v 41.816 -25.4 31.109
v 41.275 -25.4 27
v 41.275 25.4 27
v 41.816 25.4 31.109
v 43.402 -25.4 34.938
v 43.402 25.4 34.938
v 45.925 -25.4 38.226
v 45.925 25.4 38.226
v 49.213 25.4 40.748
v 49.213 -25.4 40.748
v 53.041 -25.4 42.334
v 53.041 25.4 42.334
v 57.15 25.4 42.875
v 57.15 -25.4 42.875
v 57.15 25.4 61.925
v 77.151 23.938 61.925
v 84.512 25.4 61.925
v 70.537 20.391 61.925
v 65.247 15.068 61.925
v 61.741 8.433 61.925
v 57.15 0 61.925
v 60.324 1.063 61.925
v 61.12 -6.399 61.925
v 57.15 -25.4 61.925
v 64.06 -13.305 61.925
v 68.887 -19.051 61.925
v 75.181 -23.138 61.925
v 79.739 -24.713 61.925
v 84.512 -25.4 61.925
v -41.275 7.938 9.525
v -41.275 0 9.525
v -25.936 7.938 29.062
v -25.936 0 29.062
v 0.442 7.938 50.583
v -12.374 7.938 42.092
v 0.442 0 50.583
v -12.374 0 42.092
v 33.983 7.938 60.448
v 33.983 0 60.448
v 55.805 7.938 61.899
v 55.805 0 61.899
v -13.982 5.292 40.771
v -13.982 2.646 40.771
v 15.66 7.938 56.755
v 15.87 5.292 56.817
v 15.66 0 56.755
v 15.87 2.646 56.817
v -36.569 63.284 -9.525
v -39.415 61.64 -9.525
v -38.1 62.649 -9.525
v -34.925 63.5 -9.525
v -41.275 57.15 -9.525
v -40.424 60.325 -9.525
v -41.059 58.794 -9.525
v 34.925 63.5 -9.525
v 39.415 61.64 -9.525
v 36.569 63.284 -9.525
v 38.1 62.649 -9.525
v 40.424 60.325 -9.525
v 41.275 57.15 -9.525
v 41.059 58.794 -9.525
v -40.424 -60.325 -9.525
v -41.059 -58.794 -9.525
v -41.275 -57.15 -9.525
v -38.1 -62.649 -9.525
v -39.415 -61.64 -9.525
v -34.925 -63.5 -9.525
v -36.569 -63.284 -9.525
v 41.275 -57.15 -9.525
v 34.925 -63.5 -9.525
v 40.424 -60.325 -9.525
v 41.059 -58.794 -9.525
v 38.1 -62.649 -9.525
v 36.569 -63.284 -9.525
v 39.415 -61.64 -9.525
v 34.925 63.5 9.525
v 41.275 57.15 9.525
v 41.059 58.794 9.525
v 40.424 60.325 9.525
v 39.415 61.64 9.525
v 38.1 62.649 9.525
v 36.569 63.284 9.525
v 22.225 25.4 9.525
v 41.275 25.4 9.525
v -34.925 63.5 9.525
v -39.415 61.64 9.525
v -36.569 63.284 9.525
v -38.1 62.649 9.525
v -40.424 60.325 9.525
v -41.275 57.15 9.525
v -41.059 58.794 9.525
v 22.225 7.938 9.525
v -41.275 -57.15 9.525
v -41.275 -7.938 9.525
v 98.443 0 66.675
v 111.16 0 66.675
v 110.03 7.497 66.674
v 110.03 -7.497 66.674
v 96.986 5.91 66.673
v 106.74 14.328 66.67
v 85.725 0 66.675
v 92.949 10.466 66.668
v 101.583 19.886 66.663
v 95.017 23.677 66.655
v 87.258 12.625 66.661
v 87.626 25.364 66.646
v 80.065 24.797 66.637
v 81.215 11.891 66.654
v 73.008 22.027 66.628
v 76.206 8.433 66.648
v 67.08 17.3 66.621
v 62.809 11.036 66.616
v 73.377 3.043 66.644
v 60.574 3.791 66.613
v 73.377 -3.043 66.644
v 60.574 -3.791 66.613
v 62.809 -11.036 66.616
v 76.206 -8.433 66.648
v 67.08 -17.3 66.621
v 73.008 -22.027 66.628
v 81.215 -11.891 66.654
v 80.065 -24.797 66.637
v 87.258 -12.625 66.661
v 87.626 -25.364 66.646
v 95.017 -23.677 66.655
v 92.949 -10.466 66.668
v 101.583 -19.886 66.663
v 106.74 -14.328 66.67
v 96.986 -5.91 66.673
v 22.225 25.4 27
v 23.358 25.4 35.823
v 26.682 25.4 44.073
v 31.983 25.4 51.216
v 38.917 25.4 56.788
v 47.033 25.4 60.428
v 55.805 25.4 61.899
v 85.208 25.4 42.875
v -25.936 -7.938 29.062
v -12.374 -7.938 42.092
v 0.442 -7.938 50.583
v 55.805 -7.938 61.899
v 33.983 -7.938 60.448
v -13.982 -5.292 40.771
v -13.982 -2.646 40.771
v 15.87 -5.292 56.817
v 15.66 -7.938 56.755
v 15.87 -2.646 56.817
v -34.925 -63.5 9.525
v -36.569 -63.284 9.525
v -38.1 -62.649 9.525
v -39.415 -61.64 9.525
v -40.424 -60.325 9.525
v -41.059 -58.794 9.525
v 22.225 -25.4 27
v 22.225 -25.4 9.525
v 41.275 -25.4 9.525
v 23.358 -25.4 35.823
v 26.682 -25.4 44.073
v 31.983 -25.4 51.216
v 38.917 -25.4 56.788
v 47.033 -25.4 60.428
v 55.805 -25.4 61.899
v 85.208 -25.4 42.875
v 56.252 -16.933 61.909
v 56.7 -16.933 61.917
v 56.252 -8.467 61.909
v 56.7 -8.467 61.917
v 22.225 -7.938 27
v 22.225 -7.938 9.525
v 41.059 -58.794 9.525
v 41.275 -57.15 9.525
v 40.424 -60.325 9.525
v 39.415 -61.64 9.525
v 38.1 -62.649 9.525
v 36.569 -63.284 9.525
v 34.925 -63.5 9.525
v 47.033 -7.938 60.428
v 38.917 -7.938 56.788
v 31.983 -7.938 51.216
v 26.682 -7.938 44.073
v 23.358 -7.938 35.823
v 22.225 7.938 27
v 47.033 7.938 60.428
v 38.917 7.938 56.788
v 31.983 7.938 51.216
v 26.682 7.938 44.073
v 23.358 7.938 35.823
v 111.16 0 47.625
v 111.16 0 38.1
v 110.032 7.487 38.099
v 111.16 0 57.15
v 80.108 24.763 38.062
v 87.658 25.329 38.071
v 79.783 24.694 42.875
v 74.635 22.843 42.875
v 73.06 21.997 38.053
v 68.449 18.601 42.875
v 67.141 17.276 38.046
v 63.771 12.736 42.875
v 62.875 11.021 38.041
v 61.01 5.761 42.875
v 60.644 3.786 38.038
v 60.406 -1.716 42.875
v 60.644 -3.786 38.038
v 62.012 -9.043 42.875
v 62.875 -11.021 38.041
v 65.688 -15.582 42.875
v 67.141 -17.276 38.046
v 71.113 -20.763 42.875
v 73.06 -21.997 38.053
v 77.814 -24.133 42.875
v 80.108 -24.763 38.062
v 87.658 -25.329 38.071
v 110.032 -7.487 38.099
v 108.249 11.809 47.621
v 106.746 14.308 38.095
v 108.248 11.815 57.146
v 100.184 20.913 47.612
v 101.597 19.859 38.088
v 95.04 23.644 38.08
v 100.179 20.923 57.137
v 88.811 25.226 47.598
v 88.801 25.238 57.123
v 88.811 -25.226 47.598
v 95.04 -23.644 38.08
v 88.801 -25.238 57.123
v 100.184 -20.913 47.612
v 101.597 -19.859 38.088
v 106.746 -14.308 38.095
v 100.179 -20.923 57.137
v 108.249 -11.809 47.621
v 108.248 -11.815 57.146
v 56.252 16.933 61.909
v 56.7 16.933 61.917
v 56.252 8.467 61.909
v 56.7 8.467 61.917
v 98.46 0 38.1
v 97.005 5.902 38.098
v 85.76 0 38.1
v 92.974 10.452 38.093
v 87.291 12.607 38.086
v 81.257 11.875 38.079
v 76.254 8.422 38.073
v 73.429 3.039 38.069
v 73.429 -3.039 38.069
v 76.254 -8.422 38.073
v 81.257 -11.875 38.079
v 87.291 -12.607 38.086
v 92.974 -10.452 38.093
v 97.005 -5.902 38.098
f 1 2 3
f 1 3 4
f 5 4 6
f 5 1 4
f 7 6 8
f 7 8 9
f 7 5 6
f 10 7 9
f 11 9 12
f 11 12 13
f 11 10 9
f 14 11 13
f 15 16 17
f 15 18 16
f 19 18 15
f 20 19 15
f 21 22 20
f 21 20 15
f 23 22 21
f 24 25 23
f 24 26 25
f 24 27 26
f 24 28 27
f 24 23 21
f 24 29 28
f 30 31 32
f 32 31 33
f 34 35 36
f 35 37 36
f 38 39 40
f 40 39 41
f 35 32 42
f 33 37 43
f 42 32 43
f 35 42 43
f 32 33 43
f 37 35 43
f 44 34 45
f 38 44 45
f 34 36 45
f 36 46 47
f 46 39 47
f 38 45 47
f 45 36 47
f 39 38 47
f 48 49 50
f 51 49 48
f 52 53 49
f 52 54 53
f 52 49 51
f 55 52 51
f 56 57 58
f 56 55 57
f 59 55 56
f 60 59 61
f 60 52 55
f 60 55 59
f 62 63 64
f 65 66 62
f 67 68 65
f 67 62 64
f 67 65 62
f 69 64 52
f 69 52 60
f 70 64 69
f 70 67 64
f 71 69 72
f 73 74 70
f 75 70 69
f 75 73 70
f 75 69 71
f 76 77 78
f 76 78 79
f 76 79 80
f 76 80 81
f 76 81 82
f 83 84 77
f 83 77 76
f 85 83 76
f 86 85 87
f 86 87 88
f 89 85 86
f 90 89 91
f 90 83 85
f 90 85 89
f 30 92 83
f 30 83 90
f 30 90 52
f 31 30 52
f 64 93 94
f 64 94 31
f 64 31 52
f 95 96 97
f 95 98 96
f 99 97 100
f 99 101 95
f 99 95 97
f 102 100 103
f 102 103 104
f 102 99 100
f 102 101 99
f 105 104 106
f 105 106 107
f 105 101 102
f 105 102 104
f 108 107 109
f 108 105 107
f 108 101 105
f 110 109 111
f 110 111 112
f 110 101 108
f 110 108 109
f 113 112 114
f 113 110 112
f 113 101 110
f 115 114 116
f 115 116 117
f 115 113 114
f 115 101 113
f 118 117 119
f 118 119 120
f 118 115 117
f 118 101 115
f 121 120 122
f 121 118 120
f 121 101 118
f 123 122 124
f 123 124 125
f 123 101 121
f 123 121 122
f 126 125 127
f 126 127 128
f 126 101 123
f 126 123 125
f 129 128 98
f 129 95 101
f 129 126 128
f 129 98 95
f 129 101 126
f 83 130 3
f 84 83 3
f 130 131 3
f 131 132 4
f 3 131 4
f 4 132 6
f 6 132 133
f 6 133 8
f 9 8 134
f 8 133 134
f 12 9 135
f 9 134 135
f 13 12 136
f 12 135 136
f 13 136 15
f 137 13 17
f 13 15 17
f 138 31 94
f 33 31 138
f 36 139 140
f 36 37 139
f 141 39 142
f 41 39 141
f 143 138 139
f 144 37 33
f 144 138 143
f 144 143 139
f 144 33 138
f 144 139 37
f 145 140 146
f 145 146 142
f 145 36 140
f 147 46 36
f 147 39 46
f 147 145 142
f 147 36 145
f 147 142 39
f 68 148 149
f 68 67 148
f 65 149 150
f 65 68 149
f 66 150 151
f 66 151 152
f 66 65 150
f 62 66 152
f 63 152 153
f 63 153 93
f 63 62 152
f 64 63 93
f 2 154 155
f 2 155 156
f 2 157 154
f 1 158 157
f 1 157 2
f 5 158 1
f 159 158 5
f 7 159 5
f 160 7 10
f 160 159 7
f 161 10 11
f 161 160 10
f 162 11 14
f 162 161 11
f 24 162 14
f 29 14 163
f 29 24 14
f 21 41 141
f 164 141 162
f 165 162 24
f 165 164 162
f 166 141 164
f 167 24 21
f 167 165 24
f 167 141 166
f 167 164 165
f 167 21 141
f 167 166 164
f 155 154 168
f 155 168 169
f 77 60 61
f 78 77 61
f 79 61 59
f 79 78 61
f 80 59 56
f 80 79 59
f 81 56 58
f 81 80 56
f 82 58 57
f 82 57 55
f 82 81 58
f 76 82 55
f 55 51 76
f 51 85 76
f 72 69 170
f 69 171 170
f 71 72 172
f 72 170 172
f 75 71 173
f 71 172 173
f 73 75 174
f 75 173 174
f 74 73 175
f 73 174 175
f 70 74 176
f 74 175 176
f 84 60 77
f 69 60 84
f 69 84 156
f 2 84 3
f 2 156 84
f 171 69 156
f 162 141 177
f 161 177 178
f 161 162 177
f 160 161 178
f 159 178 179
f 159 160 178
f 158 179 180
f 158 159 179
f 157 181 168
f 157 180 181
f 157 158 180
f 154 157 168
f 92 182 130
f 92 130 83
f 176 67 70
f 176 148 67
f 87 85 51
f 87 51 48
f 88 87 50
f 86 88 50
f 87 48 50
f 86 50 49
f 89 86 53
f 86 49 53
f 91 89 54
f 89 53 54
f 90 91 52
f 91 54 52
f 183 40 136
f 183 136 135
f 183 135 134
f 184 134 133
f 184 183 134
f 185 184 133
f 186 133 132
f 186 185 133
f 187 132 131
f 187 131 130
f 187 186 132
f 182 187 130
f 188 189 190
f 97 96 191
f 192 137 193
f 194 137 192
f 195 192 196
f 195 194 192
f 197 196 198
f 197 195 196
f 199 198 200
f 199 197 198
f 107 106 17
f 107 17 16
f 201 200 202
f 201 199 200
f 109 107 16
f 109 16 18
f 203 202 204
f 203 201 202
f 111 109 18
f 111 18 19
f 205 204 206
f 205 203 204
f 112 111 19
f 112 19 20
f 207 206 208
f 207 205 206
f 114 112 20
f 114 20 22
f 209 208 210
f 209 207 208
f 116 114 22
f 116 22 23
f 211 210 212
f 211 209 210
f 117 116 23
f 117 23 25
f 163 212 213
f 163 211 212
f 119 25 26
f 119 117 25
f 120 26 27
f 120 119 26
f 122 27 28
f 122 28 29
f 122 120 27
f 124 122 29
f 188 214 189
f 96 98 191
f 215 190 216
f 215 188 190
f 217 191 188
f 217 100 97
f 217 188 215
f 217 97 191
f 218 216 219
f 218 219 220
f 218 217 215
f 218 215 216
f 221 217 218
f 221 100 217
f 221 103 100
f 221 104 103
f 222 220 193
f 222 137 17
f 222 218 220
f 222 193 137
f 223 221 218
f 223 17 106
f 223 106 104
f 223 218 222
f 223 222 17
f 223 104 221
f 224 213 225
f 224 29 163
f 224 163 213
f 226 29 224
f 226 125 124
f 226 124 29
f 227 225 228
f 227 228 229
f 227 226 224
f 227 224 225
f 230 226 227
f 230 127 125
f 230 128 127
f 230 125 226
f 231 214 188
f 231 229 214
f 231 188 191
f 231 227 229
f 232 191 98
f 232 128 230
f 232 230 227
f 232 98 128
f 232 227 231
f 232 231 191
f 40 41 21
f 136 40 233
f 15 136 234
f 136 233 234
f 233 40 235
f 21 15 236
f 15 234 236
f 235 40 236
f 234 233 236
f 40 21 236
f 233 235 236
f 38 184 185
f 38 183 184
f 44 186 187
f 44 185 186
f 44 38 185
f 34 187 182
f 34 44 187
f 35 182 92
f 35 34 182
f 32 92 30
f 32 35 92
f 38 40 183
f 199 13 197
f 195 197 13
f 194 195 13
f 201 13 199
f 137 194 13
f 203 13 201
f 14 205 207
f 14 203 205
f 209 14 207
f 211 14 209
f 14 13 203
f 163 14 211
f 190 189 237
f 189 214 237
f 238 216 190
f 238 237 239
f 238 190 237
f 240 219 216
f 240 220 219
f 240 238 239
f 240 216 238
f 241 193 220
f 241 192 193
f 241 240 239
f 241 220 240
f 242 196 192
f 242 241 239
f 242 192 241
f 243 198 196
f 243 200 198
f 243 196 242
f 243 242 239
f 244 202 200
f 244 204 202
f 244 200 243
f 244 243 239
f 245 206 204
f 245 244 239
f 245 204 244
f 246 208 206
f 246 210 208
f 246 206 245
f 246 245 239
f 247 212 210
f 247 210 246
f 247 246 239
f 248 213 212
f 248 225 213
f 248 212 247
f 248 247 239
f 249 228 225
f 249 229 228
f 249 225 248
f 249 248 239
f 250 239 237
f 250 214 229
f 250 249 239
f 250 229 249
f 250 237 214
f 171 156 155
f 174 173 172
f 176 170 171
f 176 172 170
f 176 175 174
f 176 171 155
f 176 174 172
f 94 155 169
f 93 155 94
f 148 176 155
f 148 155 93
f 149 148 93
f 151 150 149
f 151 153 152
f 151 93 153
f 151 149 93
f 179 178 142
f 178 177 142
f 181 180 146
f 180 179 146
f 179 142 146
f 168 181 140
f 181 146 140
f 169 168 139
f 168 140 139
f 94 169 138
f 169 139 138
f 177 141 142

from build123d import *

# Parameters (mm, degrees)
F1_DEPTH = 63.5
F0_W     = 25.3649728298
F0_H     = 19.05
F2_DEPTH = 25.4
F3_DEPTH = 7.9375
F5_R     = 6.35


with BuildPart() as f1:
    # F0 (on Front) → F1 (new body, symmetric)
    with BuildSketch(Plane.XZ):
        Polygon((-41.275, -9.525), (41.275, -9.525), (41.275, 9.525), (22.225, 9.525), (-41.275, 9.525), align=None)
    extrude(amount=F1_DEPTH, both=True)

    # F0 (on Front) → F2 (join, symmetric)
    with BuildSketch(Plane.XZ):
        with BuildLine():
            Line((22.225, 9.525), (41.275, 9.525))
            Line((41.275, 9.525), (41.275, 27.0002))
            ThreePointArc((41.275, 27.0002), (45.9246798487, 38.2255201513), (57.15, 42.8752))
            Line((57.15, 42.8752), (60.3600271702, 42.8752))
            Line((60.3600271702, 42.8752), (60.3600271702, 61.9252))
            Line((60.3600271702, 61.9252), (57.15, 61.9252))
            add(Edge.make_bspline(
                [(55.8049149759, 61.8992884018), (56.250937163, 61.9088103387), (56.6992894846, 61.9174422694), (57.15, 61.9252)],
                knots=[110.4669042638, 110.4669042638, 110.4669042638, 110.4669042638, 111.5045361635, 111.5045361635, 111.5045361635, 111.5045361635], degree=3))
            ThreePointArc((55.8049149759, 61.8992884018), (31.9832290563, 51.215675739), (22.225, 27.0002))
            Line((22.225, 27.0002), (22.225, 9.525))
        make_face()
        with Locations((73.0425135851, 52.4002)):
            Rectangle(F0_W, F0_H)
    extrude(amount=F2_DEPTH, both=True)

    # F0 (on Front) → F3 (join, symmetric)
    with BuildSketch(Plane.XZ):
        with BuildLine():
            add(Edge.make_bspline(
                [(-41.275, 9.525), (-12.7532446295, 49.7846645012), (8.3211297732, 60.8855773876), (55.8049149759, 61.8992884018)],
                knots=[0, 0, 0, 0, 110.4669042638, 110.4669042638, 110.4669042638, 110.4669042638], degree=3))
            Line((-41.275, 9.525), (22.225, 9.525))
            Line((22.225, 9.525), (22.225, 27.0002))
            ThreePointArc((22.225, 27.0002), (31.9832290563, 51.215675739), (55.8049149759, 61.8992884018))
        make_face()
    extrude(amount=F3_DEPTH, both=True)

    # F0 (on Front) → F4 (revolve)
    with BuildSketch(Plane.XZ):
        Polygon((85.725, 66.675), (85.7600271702, 38.1), (111.1600271702, 38.1), (111.1600271702, 66.675), align=None)
    revolve(axis=Axis((85.7425135851, 0, 52.3875), (-0.0012257968, 0, 0.9999992487)))

    # F5
    f5_edges = [f1.edges().sort_by_distance(p)[0] for p in [
        (-41.275, -63.5, 0),
        (41.275, -63.5, 0),
        (41.275, 63.5, 0),
        (-41.275, 63.5, 0),
    ]]
    fillet(f5_edges, radius=F5_R)


solid = f1.part
